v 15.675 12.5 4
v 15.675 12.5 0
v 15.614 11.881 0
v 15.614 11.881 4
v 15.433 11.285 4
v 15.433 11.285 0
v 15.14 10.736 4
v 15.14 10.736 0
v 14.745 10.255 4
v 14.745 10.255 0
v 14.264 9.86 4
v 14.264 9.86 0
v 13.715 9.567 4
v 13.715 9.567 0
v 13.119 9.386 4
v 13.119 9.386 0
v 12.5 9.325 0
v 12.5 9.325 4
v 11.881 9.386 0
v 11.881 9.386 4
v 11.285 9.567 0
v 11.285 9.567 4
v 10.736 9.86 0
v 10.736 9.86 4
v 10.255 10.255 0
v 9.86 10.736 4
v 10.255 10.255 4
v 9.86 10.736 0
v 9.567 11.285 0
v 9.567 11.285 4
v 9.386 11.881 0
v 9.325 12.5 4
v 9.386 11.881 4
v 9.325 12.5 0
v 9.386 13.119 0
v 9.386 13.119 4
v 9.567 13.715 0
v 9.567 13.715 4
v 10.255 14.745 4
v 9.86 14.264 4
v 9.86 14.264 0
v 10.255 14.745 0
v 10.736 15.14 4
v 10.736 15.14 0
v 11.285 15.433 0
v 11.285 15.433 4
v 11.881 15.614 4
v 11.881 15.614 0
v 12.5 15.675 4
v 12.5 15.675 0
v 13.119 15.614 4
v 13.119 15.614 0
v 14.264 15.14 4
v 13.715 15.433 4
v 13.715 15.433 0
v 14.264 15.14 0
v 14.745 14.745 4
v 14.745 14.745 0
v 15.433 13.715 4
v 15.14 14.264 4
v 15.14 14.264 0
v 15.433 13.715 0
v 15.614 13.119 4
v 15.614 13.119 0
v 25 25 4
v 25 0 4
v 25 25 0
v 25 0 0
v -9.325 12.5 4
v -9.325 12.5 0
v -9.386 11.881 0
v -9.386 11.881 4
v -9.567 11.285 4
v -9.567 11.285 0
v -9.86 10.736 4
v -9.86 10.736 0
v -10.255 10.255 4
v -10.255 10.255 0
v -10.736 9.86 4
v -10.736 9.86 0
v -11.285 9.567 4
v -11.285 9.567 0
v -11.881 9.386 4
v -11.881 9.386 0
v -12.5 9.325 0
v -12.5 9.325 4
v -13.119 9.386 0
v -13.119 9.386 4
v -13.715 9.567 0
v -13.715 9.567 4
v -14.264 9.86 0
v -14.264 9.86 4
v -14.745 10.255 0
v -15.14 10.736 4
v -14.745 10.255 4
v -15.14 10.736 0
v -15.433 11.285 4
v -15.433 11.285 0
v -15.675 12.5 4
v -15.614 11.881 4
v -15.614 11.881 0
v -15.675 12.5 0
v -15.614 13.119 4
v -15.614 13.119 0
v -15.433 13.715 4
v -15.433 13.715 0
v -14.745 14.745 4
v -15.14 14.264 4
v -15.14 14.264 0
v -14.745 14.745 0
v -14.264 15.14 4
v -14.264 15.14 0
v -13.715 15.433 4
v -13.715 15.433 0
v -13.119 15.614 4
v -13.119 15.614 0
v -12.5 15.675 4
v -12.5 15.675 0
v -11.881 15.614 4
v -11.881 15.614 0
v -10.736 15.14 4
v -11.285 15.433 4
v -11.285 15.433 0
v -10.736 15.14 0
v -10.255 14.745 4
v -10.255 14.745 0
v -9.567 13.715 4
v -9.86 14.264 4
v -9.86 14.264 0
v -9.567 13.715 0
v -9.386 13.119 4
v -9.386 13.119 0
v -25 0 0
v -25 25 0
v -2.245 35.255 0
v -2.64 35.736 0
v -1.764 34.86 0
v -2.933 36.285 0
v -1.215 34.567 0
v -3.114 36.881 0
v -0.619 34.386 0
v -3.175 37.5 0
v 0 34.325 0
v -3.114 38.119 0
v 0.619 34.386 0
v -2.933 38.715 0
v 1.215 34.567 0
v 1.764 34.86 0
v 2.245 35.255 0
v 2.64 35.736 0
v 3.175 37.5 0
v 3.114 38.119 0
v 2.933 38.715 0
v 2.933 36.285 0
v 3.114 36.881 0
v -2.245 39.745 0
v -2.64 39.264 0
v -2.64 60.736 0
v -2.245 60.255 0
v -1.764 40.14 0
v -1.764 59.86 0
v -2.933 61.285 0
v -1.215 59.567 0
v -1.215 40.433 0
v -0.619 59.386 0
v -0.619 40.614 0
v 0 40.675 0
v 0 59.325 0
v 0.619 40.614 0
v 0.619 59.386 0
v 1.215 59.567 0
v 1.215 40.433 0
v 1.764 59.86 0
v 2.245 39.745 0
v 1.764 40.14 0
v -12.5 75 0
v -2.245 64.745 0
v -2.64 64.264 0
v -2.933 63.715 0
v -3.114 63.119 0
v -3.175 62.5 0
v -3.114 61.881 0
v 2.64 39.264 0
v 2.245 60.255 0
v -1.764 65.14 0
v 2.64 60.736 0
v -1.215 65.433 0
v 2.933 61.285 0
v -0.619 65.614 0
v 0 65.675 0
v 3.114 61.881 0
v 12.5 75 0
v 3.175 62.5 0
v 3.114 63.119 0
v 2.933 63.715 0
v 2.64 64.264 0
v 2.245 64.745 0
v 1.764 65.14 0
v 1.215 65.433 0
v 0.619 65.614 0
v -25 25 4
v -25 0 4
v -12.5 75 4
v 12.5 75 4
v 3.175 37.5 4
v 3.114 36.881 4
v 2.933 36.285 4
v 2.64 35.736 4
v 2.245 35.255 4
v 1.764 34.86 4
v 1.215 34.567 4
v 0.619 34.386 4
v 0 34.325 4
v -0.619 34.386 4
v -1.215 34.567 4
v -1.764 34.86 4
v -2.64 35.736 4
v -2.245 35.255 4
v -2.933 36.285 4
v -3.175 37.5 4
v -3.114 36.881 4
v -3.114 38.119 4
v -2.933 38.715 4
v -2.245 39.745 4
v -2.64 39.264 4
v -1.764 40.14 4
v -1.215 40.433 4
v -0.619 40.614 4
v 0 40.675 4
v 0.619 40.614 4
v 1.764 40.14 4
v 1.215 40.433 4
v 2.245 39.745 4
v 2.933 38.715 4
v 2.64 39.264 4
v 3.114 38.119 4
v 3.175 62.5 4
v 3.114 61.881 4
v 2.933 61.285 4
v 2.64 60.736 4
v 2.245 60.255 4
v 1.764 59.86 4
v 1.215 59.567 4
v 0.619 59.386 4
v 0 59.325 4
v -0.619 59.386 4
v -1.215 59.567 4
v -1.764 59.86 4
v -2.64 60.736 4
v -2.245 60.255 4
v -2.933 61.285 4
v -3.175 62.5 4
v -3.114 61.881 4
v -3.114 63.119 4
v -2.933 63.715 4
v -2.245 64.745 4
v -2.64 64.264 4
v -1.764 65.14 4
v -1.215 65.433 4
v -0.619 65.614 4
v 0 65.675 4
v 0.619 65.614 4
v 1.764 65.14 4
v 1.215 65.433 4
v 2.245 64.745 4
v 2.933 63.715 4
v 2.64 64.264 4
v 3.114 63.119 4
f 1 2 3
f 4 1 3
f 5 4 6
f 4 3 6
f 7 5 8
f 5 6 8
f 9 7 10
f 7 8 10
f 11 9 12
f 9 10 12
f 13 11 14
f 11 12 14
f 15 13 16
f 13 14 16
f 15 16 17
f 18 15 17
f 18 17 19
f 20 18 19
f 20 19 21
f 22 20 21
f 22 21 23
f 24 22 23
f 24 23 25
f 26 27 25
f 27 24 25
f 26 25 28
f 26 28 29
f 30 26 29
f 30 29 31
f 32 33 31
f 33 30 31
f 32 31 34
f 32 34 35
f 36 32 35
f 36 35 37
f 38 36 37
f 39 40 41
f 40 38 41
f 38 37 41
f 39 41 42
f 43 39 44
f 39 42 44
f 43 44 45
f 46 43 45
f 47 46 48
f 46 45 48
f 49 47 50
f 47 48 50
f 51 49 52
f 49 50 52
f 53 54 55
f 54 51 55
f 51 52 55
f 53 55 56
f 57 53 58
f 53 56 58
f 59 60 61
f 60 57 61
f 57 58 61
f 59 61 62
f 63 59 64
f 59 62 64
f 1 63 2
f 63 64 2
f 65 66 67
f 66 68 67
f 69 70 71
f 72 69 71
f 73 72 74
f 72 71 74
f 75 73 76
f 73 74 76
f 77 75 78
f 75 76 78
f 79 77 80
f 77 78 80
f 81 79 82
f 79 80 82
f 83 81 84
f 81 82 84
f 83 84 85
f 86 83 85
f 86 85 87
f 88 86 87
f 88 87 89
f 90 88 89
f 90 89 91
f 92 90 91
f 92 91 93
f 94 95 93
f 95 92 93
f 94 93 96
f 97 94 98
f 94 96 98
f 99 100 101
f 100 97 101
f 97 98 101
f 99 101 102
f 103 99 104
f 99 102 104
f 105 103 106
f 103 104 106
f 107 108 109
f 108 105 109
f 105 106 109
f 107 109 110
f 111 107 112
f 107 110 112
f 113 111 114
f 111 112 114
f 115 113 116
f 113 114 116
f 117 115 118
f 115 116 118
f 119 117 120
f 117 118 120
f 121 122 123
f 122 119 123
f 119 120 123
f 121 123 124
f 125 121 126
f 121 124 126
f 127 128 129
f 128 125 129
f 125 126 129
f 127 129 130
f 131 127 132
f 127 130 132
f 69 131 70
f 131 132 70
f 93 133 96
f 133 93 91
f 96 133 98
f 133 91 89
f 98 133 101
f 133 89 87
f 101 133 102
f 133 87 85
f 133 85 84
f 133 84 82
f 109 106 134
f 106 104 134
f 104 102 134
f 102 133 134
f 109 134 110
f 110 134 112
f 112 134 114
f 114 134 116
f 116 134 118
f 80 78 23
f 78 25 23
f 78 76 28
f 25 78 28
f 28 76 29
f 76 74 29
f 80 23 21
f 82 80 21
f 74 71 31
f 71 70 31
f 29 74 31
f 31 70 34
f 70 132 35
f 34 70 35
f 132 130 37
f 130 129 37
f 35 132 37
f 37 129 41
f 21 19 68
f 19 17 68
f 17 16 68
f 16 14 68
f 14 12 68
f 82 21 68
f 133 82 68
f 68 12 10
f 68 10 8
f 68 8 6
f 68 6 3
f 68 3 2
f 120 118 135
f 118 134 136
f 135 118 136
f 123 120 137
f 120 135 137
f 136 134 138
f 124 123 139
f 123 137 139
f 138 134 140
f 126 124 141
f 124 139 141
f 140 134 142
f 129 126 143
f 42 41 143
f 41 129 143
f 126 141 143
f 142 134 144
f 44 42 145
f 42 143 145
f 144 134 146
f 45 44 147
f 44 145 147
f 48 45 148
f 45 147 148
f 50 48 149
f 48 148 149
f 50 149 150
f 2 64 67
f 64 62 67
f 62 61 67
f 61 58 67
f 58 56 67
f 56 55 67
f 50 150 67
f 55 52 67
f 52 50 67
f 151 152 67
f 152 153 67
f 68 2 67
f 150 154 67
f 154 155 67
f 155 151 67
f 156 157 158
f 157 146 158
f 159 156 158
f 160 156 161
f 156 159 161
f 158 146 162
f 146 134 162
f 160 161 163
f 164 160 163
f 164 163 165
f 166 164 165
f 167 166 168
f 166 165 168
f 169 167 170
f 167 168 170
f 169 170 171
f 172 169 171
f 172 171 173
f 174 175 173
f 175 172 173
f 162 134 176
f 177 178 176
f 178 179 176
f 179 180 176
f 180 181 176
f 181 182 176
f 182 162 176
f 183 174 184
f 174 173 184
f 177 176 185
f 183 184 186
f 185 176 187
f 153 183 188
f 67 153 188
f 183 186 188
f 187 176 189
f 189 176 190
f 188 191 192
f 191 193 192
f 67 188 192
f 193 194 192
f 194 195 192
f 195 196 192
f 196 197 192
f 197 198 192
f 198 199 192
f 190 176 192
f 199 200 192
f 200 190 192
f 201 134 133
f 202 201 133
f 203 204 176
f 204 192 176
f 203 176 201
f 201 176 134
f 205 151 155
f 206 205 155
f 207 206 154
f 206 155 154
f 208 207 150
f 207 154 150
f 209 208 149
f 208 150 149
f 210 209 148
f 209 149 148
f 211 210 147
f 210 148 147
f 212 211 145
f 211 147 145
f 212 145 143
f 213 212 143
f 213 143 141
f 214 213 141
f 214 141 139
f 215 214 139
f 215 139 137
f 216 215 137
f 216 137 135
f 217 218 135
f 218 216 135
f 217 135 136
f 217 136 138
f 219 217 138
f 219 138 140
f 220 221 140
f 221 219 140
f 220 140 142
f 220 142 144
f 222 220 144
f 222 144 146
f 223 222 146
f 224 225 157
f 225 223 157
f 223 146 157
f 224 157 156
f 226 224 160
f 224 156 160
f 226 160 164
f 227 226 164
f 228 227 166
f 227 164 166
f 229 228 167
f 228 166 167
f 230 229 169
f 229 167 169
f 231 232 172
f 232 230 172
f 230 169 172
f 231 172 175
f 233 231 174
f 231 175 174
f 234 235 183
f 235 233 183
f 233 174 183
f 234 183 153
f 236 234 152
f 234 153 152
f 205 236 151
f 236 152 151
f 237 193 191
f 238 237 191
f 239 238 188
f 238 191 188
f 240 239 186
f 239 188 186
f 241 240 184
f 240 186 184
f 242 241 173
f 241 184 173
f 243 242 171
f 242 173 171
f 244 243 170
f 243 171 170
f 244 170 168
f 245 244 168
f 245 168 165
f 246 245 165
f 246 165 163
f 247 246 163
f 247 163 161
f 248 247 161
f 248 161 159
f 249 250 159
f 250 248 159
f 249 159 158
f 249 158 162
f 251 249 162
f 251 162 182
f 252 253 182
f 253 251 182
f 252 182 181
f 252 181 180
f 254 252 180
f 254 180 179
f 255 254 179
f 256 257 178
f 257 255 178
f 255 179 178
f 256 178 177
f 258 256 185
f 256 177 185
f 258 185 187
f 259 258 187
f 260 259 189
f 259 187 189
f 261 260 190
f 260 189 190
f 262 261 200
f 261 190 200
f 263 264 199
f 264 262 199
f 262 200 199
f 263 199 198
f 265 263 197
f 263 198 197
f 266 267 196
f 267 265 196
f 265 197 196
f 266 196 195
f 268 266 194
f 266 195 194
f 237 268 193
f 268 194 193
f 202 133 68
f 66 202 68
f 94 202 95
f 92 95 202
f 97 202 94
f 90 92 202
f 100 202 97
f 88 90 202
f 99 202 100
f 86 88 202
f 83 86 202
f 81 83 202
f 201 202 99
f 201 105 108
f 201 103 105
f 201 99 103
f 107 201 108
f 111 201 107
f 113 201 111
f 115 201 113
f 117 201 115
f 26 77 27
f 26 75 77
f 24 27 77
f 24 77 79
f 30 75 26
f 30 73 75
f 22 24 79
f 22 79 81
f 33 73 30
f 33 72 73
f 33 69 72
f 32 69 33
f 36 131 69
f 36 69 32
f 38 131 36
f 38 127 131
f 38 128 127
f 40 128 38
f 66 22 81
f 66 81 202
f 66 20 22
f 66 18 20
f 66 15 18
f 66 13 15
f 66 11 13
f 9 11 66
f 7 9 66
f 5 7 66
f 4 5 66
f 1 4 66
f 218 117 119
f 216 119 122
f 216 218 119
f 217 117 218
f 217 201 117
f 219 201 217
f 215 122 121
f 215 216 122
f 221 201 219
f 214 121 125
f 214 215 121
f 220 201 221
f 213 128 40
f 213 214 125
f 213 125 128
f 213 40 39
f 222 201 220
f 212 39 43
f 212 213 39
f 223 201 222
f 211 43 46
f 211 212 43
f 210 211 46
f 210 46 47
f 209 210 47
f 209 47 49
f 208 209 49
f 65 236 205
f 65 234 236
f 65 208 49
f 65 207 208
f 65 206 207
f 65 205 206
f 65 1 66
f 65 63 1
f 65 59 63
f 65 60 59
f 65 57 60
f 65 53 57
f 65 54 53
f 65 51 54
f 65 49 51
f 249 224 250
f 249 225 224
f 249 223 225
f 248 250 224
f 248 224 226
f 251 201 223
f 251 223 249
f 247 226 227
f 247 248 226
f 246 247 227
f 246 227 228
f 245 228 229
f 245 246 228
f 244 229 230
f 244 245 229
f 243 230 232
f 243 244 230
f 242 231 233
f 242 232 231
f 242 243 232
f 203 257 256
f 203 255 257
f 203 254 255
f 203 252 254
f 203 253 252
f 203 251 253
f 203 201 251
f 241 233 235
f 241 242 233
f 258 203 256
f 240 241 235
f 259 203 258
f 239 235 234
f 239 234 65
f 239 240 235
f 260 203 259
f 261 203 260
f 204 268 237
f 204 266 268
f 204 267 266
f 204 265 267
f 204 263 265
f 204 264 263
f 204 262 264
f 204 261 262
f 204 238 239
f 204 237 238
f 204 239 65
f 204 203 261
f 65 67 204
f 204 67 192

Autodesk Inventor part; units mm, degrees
ref_plane "YZ Plane" through (0, 0, 0) normal (1, 0, 0) x (0, 1, 0)
ref_plane "XZ Plane" through (0, 0, 0) normal (0, 1, 0) x (-1, 0, 0)
ref_plane "XY Plane" through (0, 0, 0) normal (0, 0, 1) x (1, 0, 0)
sketch "Sketch_1" plane through (0, 0, 0) normal (0, 0, 1) x (1, 0, 0)
  line L0 (-25, 25) -> (-25, 0)
  line L1 (-25, 0) -> (25, 0)
  line L2 (25, 0) -> (25, 25)
  line L3 (25, 25) -> (12.5, 75)
  line L4 (12.5, 75) -> (-12.5, 75)
  line L5 (-12.5, 75) -> (-25, 25)
  circle A0 centre (12.5, 12.5) radius 3.175
  circle A1 centre (0, 37.5) radius 3.175
  circle A2 centre (0, 62.5) radius 3.175
  circle A3 centre (-12.5, 12.5) radius 3.175
extrude "Extrusion1" add sketch "Sketch_1" along normal blind 4
properties part number "25-4141"
